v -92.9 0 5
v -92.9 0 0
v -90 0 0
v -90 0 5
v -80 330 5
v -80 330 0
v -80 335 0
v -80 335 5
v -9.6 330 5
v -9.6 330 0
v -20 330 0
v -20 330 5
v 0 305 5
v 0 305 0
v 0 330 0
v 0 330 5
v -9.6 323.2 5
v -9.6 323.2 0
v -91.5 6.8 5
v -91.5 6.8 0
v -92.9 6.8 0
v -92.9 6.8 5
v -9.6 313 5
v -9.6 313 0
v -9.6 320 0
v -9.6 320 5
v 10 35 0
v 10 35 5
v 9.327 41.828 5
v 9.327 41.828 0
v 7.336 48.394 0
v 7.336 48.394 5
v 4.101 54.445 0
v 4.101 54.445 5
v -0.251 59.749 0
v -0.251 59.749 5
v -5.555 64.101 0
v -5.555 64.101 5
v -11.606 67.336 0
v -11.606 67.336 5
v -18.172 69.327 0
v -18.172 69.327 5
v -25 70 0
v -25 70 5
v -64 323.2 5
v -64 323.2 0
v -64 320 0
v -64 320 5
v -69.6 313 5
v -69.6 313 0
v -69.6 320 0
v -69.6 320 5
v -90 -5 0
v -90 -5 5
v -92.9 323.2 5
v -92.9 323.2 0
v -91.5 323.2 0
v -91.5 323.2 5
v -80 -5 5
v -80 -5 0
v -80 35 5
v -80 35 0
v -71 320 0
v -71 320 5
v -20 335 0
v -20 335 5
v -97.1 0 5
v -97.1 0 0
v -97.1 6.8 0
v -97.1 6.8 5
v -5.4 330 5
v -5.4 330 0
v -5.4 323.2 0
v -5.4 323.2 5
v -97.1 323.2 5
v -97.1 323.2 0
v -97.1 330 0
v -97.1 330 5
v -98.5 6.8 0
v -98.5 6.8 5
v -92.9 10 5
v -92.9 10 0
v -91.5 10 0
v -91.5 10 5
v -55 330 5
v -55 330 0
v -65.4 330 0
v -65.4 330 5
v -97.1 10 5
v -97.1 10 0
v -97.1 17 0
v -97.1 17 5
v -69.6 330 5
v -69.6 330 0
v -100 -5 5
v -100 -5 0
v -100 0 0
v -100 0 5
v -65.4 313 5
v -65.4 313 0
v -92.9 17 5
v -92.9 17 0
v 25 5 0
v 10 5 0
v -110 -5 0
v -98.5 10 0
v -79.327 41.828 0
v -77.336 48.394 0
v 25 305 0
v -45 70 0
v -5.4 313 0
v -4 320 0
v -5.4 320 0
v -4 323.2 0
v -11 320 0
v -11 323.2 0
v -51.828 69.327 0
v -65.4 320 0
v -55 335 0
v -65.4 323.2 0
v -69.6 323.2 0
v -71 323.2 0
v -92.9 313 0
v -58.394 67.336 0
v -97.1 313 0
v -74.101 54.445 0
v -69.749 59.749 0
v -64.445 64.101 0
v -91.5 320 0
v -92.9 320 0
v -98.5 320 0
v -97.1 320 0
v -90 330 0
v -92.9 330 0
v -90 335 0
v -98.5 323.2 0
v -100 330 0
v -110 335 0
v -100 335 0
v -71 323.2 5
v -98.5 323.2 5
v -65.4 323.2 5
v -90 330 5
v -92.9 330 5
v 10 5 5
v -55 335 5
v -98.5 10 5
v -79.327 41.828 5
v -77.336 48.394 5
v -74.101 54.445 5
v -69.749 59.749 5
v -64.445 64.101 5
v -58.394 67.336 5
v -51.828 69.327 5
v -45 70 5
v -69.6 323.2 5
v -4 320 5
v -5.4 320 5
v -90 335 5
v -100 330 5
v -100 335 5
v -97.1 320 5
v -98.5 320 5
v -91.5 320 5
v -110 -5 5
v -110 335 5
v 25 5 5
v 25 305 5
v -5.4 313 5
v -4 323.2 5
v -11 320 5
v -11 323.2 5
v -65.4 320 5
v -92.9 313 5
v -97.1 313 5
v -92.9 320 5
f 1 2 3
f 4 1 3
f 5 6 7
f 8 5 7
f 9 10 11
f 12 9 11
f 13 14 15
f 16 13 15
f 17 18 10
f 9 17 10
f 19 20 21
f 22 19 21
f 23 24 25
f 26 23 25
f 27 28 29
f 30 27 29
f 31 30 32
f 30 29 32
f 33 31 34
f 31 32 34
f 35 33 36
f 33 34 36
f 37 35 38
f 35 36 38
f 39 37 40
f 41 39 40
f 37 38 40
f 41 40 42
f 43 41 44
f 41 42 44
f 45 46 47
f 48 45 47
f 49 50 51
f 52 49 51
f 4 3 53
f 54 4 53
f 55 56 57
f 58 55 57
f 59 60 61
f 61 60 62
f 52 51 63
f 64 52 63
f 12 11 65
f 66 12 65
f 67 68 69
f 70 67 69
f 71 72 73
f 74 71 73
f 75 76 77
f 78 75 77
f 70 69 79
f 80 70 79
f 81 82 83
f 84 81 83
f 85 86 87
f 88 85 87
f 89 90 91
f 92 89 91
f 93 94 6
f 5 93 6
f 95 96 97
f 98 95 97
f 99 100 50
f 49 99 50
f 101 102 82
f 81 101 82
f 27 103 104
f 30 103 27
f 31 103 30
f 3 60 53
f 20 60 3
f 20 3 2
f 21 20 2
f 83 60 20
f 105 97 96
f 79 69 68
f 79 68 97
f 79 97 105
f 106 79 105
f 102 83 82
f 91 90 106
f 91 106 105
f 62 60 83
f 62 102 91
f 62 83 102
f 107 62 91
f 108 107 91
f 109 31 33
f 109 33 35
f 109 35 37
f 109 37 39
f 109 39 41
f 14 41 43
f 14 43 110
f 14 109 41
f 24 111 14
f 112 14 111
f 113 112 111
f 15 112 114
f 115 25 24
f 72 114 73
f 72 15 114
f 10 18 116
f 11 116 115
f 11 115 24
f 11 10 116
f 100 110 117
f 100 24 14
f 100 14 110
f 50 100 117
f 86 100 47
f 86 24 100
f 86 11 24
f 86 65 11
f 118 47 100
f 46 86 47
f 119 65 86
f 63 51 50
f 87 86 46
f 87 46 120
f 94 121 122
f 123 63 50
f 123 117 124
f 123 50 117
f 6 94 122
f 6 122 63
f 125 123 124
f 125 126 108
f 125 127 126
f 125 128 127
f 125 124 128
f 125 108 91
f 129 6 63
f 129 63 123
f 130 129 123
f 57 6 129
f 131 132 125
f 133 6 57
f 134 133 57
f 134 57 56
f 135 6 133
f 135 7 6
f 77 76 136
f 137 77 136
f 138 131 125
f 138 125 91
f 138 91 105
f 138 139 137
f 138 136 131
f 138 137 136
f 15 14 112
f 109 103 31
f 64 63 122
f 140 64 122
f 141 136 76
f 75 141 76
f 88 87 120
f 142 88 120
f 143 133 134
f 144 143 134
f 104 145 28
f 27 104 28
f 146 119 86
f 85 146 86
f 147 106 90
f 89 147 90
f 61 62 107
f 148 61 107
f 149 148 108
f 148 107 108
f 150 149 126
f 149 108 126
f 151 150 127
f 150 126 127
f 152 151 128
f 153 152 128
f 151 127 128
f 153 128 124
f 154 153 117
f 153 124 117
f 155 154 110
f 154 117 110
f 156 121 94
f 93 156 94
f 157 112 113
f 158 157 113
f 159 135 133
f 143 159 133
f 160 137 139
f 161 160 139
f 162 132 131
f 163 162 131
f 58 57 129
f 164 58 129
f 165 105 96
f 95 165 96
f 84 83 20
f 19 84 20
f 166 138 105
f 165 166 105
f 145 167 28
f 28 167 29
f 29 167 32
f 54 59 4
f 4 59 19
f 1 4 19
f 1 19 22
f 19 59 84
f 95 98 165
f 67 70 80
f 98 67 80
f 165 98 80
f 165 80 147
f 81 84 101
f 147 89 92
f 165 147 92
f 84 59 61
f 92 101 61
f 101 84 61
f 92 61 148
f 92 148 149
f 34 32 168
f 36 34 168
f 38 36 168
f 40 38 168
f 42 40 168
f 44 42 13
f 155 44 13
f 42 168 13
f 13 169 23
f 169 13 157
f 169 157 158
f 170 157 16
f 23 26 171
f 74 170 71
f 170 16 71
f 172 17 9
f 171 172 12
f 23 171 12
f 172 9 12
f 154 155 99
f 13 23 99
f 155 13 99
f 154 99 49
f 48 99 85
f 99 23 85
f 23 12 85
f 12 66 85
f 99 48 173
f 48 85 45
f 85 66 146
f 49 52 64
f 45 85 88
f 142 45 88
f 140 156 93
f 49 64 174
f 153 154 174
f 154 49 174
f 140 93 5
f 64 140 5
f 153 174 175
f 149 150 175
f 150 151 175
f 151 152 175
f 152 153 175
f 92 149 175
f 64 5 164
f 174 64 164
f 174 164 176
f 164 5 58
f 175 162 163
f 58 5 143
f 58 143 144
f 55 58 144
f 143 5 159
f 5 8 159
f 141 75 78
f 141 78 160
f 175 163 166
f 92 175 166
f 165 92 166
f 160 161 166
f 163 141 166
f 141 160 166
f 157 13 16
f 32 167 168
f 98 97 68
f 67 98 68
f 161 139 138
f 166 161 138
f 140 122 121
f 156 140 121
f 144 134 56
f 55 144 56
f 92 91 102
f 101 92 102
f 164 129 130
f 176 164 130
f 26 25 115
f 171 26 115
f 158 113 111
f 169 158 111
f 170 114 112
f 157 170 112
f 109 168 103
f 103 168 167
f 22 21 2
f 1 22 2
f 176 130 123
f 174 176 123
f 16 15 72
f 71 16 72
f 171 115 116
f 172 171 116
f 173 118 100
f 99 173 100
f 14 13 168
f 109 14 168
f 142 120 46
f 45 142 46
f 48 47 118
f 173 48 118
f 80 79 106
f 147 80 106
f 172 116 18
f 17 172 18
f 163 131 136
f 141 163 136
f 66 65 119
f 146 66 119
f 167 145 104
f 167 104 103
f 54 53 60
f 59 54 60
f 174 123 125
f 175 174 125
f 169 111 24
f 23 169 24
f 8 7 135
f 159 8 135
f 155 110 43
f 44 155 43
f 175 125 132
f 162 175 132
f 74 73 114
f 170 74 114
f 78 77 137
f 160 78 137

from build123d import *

# Parameters (mm, degrees)
BOSS_EXTRUDE1_DEPTH   = 5
SKETCH1_W             = 35
SKETCH1_H             = 5
BOSS_EXTRUDE1_2_DEPTH = 5
SKETCH2_W             = 56.57205094
SKETCH2_H             = 46.29963395
CUT_EXTRUDE1_DEPTH    = 10
BOSS_EXTRUDE2_DEPTH   = 5
SKETCH4_W             = 15
SKETCH4_H             = 10
CUT_EXTRUDE2_DEPTH    = 5


with BuildPart() as part:
    # Sketch1 → Boss-Extrude1 (new body)
    with BuildSketch(Plane.XY):
        with BuildLine():
            Line((-45, 70), (0, 70))
            Line((0, 70), (0, 330))
            Line((0, 330), (-5.4, 330))
            Line((-5.4, 330), (-5.4, 323.2))
            Line((-5.4, 323.2), (-4, 323.2))
            Line((-4, 323.2), (-4, 320))
            Line((-4, 320), (-5.4, 320))
            Line((-5.4, 320), (-5.4, 313))
            Line((-5.4, 313), (-9.6, 313))
            Line((-9.6, 313), (-9.6, 320))
            Line((-9.6, 320), (-11, 320))
            Line((-11, 320), (-11, 323.2))
            Line((-11, 323.2), (-9.6, 323.2))
            Line((-9.6, 323.2), (-9.6, 330))
            Line((-9.6, 330), (-20, 330))
            Line((-20, 330), (-20, 335))
            Line((-20, 335), (-55, 335))
            Line((-55, 335), (-55, 330))
            Line((-55, 330), (-65.4, 330))
            Line((-65.4, 330), (-65.4, 323.2))
            Line((-65.4, 323.2), (-64, 323.2))
            Line((-64, 323.2), (-64, 320))
            Line((-64, 320), (-65.4, 320))
            Line((-65.4, 320), (-65.4, 313))
            Line((-65.4, 313), (-69.6, 313))
            Line((-69.6, 313), (-69.6, 320))
            Line((-69.6, 320), (-71, 320))
            Line((-71, 320), (-71, 323.2))
            Line((-71, 323.2), (-69.6, 323.2))
            Line((-69.6, 323.2), (-69.6, 330))
            Line((-69.6, 330), (-80, 330))
            Line((-80, 330), (-80, 335))
            Line((-80, 335), (-90, 335))
            Line((-90, 335), (-90, 330))
            Line((-90, 330), (-92.9, 330))
            Line((-92.9, 330), (-92.9, 323.2))
            Line((-92.9, 323.2), (-91.5, 323.2))
            Line((-91.5, 323.2), (-91.5, 320))
            Line((-91.5, 320), (-92.9, 320))
            Line((-92.9, 320), (-92.9, 313))
            Line((-92.9, 313), (-97.1, 313))
            Line((-97.1, 313), (-97.1, 320))
            Line((-97.1, 320), (-98.5, 320))
            Line((-98.5, 320), (-98.5, 323.2))
            Line((-98.5, 323.2), (-97.1, 323.2))
            Line((-97.1, 323.2), (-97.1, 330))
            Line((-97.1, 330), (-100, 330))
            Line((-100, 330), (-100, 335))
            Line((-100, 335), (-110, 335))
            Line((-110, 335), (-110, -5))
            Line((-110, -5), (-100, -5))
            Line((-100, -5), (-100, 0))
            Line((-100, 0), (-97.1, 0))
            Line((-97.1, 0), (-97.1, 6.8))
            Line((-97.1, 6.8), (-98.5, 6.8))
            Line((-98.5, 6.8), (-98.5, 10))
            Line((-98.5, 10), (-97.1, 10))
            Line((-97.1, 10), (-97.1, 17))
            Line((-97.1, 17), (-92.9, 17))
            Line((-92.9, 17), (-92.9, 10))
            Line((-92.9, 10), (-91.5, 10))
            Line((-91.5, 10), (-91.5, 6.8))
            Line((-91.5, 6.8), (-92.9, 6.8))
            Line((-92.9, 6.8), (-92.9, 0))
            Line((-92.9, 0), (-90, 0))
            Line((-90, 0), (-90, -5))
            Line((-90, -5), (-80, -5))
            Line((-80, -5), (-80, 35))
            ThreePointArc((-80, 35), (-69.748737342, 59.748737342), (-45, 70))
        make_face()
    extrude(amount=BOSS_EXTRUDE1_DEPTH)

    # Sketch3 → Boss-Extrude2 (add)
    with BuildSketch(Plane.XY.offset(5)):
        with BuildLine():
            Line((0, 305), (25, 305))
            Line((25, 305), (25, 70))
            Line((25, 70), (25, -5))
            Line((25, -5), (10, -5))
            Line((10, -5), (10, 35))
            ThreePointArc((10, 35), (-0.251262658, 59.748737342), (-25, 70))
            Line((-25, 70), (0, 70))
            Line((0, 70), (0, 305))
        make_face()
    extrude(amount=-BOSS_EXTRUDE2_DEPTH)

    # Sketch4 → Cut-Extrude2 (cut)
    with BuildSketch(Plane.XY.offset(5)):
        with Locations((17.5, 0)):
            Rectangle(SKETCH4_W, SKETCH4_H)
    extrude(amount=-CUT_EXTRUDE2_DEPTH, mode=Mode.SUBTRACT)


with BuildPart() as body_2:
    # Sketch1 → Boss-Extrude1 2 (new body)
    with BuildSketch(Plane.XY):
        with Locations((-37.5, -2.5)):
            Rectangle(SKETCH1_W, SKETCH1_H)
    extrude(amount=BOSS_EXTRUDE1_2_DEPTH)

    # Sketch2 → Cut-Extrude1 (cut)
    with BuildSketch(Plane.XY.offset(5)):
        with Locations((-32.79534341, -6.148476698)):
            Rectangle(SKETCH2_W, SKETCH2_H)
    extrude(amount=-CUT_EXTRUDE1_DEPTH, mode=Mode.SUBTRACT)


solid = part.part
